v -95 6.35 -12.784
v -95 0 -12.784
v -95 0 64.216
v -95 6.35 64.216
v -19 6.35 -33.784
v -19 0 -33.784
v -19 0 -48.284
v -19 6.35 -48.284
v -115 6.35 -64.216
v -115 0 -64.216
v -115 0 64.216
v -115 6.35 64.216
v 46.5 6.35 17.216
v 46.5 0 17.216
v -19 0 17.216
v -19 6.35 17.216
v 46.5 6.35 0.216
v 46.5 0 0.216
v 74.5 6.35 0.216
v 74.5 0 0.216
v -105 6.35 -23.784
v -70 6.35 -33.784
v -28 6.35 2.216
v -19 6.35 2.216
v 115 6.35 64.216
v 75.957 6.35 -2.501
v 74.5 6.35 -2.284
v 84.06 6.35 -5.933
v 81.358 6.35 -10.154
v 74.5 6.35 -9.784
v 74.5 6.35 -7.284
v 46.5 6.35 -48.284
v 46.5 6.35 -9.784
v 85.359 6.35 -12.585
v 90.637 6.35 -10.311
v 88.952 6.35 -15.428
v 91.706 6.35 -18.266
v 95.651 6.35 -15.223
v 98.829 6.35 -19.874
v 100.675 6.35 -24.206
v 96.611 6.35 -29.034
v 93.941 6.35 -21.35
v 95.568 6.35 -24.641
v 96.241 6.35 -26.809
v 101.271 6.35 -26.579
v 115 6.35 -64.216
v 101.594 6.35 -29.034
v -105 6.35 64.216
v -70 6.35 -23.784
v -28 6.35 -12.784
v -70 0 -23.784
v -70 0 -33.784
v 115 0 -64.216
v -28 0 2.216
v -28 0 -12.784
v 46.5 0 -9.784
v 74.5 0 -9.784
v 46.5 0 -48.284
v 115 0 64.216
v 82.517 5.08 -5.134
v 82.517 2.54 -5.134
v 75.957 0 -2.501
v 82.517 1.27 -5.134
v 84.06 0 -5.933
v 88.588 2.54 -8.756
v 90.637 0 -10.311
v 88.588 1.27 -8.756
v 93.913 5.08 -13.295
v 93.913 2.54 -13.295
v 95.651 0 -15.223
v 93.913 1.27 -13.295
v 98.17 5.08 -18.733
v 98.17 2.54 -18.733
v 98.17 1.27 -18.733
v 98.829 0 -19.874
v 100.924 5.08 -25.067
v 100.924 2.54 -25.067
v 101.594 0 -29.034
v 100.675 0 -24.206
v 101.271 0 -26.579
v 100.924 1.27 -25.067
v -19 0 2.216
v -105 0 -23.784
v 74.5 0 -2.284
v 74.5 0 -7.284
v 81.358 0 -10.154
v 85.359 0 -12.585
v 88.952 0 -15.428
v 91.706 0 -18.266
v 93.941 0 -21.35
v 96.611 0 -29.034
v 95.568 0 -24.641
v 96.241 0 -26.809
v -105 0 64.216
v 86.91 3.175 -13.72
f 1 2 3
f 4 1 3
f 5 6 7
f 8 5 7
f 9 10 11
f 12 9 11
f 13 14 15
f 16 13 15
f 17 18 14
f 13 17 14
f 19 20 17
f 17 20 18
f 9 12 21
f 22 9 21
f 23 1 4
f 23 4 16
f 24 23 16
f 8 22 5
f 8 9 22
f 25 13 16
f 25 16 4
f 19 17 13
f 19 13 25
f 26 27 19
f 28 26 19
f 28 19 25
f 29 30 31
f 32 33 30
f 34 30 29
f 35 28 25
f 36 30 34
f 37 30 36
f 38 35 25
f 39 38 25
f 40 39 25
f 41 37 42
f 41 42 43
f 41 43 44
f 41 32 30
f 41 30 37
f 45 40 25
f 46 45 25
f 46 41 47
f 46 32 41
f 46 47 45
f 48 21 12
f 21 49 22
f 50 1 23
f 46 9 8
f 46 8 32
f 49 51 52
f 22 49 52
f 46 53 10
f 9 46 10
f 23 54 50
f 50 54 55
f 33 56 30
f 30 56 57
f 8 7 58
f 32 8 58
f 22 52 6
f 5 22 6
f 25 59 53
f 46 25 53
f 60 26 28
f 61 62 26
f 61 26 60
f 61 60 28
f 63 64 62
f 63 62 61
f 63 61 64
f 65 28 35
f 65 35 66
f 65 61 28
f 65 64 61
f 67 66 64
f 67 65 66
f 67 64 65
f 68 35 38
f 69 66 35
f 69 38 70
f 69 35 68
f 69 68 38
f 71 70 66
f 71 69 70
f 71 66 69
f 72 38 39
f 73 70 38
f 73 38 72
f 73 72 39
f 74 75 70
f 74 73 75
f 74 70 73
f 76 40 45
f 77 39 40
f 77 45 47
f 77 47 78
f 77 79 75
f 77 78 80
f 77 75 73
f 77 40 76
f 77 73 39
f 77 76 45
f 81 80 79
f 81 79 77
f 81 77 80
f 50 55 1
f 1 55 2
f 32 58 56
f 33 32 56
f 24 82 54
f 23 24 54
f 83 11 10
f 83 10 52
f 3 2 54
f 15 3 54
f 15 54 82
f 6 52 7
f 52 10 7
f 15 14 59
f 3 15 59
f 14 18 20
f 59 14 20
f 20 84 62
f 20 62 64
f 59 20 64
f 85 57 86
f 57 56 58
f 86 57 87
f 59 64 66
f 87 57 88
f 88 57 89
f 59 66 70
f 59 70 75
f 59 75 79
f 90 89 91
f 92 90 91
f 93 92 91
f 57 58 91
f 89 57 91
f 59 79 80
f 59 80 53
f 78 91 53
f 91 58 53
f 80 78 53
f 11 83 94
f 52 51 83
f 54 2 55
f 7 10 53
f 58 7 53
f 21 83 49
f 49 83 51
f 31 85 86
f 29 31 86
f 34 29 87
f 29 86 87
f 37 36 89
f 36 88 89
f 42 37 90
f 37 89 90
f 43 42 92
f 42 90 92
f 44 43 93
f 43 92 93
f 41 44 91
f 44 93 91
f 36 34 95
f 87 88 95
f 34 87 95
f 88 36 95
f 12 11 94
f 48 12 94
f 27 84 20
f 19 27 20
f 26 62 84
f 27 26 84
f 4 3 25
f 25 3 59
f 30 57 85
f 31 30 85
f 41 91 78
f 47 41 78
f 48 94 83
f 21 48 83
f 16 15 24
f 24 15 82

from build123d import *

# Parameters (mm, degrees)
BOSS_EXTRUDE1_DEPTH = 6.35


with BuildPart() as part:
    # Sketch1 → Boss-Extrude1 (new body)
    with BuildSketch(Plane(origin=(0, 0, 0), x_dir=(1, 0, 0), z_dir=(0, 1, 0))):
        with BuildLine():
            Line((-115, -64.215517859), (-105, -64.215517859))
            Line((-105, -64.215517859), (-105, 23.784482141))
            Line((-105, 23.784482141), (-70, 23.784482141))
            Line((-70, 23.784482141), (-70, 33.784482141))
            Line((-70, 33.784482141), (-19, 33.784482141))
            Line((-19, 33.784482141), (-19, 48.284482141))
            Line((-19, 48.284482141), (46.5, 48.284482141))
            Line((46.5, 48.284482141), (46.5, 9.784482141))
            Line((46.5, 9.784482141), (74.5, 9.784482141))
            Line((74.5, 9.784482141), (74.5, 7.284482141))
            add(Edge.make_bspline(
                [(74.5, 7.284482141), (78.941812559, 8.679963078), (89.598105333, 14.160361523), (96.061867219, 23.189471951), (96.610613644, 29.034482141)],
                knots=[0, 0, 0, 0, 0.139776101, 0.343963844, 0.343963844, 0.343963844, 0.343963844], degree=3))
            Line((96.610613644, 29.034482141), (101.594478802, 29.034482141))
            add(Edge.make_bspline(
                [(75.956941241, 2.501457761), (80.440075067, 3.907014197), (86.917003439, 7.092067173), (94.089056782, 13.146274012), (98.414454942, 18.57956616), (100.864778933, 24.020415983), (101.497230208, 27.680092848), (101.594478802, 29.034482141)],
                knots=[0, 0, 0, 0, 0.125, 0.1875, 0.25, 0.3125, 0.348130447, 0.348130447, 0.348130447, 0.348130447], degree=3))
            Line((75.956941241, 2.501457761), (74.5, 2.284482141))
            Line((74.5, 2.284482141), (74.5, -0.215517859))
            Line((74.5, -0.215517859), (46.5, -0.215517859))
            Line((46.5, -0.215517859), (46.5, -17.215517859))
            Line((46.5, -17.215517859), (-19, -17.215517859))
            Line((-19, -17.215517859), (-19, -2.215517859))
            Line((-19, -2.215517859), (-28, -2.215517859))
            Line((-28, -2.215517859), (-28, 12.784482141))
            Line((-28, 12.784482141), (-95, 12.784482141))
            Line((-95, 12.784482141), (-95, -64.215517859))
            Line((-95, -64.215517859), (115, -64.215517859))
            Line((115, -64.215517859), (115, 64.215517859))
            Line((115, 64.215517859), (-115, 64.215517859))
            Line((-115, 64.215517859), (-115, -64.215517859))
        make_face()
    extrude(amount=BOSS_EXTRUDE1_DEPTH)


solid = part.part
